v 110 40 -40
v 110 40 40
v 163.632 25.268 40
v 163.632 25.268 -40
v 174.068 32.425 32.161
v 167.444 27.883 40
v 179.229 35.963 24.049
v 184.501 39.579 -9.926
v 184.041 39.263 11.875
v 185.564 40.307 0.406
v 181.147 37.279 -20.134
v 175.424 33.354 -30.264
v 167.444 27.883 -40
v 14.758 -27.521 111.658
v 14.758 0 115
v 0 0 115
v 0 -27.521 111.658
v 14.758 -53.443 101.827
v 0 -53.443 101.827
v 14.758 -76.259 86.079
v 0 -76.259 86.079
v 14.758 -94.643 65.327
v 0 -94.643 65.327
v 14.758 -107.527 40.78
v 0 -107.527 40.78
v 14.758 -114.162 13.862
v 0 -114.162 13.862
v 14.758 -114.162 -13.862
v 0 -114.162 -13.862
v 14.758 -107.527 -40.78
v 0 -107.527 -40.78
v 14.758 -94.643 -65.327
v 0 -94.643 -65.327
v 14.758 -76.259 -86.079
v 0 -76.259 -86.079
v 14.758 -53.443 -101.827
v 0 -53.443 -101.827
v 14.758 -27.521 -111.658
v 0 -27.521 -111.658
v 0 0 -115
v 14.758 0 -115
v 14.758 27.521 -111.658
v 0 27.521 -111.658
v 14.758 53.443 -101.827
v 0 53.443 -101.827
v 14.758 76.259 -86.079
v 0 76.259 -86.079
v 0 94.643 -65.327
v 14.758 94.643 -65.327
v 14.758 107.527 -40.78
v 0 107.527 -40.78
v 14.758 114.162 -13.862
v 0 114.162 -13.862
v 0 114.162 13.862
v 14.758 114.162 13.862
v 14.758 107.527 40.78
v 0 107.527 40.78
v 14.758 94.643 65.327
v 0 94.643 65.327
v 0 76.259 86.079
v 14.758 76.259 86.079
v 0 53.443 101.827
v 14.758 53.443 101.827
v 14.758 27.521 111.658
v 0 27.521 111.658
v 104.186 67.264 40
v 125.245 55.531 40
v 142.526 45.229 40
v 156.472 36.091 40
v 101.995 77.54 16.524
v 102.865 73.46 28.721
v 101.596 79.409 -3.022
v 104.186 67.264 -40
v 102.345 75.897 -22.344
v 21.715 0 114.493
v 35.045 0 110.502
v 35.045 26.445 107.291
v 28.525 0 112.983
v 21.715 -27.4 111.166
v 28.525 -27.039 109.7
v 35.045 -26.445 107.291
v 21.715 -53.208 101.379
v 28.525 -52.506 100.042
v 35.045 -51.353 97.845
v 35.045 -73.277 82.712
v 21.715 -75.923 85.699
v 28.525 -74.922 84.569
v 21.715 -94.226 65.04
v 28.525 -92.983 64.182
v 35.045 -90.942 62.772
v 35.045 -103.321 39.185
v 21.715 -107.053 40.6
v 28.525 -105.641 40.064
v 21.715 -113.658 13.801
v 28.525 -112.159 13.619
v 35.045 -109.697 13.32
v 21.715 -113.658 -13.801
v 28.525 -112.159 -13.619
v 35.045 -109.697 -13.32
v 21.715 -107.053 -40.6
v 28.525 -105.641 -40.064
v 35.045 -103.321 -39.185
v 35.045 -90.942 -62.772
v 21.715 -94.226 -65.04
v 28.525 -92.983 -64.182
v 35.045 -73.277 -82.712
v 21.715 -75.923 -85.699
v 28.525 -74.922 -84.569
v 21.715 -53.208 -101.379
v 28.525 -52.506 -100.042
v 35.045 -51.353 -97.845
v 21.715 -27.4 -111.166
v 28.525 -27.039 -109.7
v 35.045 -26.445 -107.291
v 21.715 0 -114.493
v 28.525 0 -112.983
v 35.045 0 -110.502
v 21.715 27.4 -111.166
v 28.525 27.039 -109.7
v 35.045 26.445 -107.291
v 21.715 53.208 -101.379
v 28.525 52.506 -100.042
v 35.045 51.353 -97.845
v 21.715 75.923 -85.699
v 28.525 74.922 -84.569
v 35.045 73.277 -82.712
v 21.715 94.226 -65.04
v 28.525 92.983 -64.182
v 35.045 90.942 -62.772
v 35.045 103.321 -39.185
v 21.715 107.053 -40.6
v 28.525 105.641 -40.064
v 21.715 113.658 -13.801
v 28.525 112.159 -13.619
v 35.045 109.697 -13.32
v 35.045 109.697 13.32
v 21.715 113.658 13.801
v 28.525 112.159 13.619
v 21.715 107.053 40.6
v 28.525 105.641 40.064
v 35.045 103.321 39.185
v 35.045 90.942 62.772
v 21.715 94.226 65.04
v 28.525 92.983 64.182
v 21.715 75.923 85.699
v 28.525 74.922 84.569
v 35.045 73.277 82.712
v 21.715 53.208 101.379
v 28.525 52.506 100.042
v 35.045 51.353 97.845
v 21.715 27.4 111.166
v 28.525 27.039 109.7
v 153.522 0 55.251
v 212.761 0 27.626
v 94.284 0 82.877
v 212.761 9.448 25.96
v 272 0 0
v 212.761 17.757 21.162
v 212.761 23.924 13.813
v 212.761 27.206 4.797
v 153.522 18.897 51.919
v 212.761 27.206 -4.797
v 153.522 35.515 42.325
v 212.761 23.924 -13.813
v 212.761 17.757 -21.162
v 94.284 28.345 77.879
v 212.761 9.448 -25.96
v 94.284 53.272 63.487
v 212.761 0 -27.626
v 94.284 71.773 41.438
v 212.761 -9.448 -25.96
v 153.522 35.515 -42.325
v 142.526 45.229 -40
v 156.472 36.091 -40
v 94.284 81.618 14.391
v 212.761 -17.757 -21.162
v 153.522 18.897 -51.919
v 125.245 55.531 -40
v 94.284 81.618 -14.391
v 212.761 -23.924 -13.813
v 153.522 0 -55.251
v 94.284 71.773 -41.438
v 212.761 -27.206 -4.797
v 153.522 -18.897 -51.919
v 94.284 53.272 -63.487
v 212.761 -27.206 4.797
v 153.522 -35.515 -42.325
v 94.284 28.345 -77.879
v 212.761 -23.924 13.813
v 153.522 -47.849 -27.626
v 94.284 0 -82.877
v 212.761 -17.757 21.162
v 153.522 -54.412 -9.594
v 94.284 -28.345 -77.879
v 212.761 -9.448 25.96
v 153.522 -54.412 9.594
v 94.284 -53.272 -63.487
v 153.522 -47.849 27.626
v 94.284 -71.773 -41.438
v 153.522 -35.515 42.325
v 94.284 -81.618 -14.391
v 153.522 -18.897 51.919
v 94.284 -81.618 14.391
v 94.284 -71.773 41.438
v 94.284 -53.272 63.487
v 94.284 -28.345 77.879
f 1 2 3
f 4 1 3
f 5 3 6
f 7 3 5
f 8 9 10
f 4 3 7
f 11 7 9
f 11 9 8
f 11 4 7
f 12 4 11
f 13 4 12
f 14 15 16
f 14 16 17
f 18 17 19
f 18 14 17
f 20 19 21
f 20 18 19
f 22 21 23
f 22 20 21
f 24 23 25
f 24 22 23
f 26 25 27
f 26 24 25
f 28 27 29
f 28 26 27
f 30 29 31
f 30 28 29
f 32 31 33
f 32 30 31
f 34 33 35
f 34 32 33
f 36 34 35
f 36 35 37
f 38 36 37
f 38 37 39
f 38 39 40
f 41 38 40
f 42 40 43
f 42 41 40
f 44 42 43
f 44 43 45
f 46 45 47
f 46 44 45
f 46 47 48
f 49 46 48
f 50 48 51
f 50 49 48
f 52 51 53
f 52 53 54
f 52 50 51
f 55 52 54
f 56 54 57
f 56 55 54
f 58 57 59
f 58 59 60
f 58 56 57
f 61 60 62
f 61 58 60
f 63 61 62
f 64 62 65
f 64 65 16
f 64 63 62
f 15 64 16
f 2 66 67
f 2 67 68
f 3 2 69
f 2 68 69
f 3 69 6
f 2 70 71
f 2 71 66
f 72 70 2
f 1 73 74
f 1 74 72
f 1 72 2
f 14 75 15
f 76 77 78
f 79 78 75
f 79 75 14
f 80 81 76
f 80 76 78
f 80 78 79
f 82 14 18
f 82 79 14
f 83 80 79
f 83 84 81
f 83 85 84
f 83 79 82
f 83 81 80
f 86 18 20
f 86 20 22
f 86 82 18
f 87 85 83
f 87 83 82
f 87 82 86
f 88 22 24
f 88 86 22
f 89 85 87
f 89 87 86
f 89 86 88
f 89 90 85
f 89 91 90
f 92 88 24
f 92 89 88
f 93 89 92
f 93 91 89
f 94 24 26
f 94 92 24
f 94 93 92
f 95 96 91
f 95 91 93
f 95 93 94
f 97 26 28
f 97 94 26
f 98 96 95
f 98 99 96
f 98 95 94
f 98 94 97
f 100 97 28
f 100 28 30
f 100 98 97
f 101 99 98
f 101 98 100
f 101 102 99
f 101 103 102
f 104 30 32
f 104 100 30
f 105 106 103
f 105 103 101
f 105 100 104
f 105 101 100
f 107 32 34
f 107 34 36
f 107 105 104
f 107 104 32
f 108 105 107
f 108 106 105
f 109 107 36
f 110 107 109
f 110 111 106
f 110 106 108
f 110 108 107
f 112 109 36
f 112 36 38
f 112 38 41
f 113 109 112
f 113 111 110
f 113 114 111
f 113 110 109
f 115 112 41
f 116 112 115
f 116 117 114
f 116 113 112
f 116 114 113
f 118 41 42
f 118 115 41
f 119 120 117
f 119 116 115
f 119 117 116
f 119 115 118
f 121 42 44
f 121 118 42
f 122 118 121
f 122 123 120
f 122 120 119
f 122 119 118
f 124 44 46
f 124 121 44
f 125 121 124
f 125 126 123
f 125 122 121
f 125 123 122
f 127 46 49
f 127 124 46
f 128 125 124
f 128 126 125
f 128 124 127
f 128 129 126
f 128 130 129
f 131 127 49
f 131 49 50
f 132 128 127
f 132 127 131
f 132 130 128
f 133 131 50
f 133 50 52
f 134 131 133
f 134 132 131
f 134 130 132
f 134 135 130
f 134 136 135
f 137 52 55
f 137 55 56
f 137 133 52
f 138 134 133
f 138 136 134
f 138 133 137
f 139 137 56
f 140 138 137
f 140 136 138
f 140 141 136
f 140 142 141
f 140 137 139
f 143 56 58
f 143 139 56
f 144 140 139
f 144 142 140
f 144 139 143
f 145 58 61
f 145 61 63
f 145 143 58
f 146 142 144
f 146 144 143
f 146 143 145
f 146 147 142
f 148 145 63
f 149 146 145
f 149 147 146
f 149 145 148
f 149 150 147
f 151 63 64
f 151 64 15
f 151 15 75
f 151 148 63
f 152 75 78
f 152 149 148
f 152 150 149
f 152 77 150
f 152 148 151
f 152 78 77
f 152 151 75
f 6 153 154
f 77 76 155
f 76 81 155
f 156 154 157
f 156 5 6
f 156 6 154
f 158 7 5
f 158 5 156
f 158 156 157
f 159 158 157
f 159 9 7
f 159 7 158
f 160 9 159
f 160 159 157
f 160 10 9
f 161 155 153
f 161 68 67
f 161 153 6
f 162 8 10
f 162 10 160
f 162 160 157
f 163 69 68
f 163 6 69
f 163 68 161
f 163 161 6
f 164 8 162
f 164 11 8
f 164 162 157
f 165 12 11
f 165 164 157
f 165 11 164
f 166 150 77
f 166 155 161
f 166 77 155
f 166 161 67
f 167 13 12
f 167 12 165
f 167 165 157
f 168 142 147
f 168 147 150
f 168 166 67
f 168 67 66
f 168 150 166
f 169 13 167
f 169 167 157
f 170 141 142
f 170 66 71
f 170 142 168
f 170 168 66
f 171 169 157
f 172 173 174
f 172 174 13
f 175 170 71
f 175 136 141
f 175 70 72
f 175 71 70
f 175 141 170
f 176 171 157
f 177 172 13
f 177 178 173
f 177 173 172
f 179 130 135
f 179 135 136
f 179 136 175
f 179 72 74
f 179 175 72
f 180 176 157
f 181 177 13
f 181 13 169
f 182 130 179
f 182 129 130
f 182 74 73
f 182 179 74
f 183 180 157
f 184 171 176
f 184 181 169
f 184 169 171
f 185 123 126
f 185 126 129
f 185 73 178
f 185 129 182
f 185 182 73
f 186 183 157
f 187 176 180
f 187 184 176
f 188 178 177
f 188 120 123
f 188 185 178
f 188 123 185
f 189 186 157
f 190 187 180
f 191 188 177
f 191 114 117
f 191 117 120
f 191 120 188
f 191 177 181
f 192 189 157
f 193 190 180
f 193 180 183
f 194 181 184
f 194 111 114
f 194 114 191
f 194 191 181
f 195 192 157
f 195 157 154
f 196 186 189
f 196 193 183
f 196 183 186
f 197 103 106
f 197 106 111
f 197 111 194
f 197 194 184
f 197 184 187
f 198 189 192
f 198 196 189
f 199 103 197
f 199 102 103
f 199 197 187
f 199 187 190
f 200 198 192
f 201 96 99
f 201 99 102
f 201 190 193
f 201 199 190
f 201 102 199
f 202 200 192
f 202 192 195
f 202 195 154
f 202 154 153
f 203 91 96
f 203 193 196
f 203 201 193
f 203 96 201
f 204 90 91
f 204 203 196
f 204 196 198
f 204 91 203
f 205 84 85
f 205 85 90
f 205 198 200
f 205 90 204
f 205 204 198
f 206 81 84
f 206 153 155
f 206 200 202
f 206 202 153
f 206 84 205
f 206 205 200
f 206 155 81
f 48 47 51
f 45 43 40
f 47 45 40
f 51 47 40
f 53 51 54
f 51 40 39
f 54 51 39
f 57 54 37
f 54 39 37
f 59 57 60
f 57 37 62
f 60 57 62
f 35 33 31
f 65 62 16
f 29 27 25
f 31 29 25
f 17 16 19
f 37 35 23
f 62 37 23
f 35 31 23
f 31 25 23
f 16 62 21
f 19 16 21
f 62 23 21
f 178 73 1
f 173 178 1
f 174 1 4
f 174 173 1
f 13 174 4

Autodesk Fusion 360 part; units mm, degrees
sketch "Sketch1" plane through (0, 0, 0) normal (0, 1, 0) x (1, 0, 0)
  line L0 (0, 0) -> (272, 0)
  line L1 (0, 0) -> (0, -115)
  line L2 (0, -115) -> (14.7579, -115)
  line L3 (35.0449, -110.5022) -> (272, 0)
  arc A0 (14.7579, -115) -> (35.0449, -110.5022) centre (14.7579, -67) ccw
  point P0 (25.4, -115)
  dimension "d1" = 272
  dimension "d2" = 115
  dimension "d3" = 25.4
  dimension "d4" = 48
revolve "Revolve1" add sketch "Sketch1" angle 360 about axis through (0, 0, 0) along (1, 0, 0)
ref_plane "WorkPlane1" through (0, 0, 0) normal (0, 0, 1) x (1, 0, 0)
sketch "Sketch2" plane through (0, 0, 0) normal (0, 0, 1) x (1, 0, 0)
  line L0 (100.5395, 84.3629) -> (110, 40)
  line L1 (110, 40) -> (163.6315, 25.2684)
  line L2 (163.6315, 25.2684) -> (189.7167, 43.1547)
  line L3 (189.7167, 43.1547) -> (100.5395, 84.3629)
extrude "Extrude1" cut sketch "Sketch2" along normal mid plane 80
